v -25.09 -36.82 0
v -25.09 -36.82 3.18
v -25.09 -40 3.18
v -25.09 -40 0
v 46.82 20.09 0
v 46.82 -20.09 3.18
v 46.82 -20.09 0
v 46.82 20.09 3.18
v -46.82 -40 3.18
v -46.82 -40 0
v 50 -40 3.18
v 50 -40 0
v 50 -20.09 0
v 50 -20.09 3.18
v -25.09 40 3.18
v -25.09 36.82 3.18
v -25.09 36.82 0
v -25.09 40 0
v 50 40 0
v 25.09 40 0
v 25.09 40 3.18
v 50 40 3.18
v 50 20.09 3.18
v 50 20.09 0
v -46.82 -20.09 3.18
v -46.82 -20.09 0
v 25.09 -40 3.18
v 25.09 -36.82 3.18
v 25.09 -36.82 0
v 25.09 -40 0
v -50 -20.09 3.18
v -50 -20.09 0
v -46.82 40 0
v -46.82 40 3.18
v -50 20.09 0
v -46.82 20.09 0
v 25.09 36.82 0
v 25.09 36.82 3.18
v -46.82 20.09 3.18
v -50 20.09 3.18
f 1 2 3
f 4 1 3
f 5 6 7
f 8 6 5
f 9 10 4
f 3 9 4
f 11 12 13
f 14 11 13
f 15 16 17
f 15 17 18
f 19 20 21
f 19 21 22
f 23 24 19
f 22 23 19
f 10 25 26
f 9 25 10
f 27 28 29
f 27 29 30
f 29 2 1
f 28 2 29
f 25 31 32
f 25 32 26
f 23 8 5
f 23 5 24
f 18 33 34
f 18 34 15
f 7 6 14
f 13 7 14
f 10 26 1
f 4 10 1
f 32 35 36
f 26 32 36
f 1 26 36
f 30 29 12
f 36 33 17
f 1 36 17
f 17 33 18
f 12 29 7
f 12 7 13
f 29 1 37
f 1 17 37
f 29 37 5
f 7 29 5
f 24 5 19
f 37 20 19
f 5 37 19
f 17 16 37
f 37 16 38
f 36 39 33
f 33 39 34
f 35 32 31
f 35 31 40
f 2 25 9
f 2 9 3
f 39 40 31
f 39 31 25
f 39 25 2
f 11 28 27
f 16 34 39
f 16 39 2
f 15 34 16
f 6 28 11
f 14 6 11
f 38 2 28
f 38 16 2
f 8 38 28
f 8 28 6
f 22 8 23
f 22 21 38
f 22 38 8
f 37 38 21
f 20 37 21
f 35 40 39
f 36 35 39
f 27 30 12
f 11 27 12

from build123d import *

# Parameters (mm, degrees)
SKETCH3_W           = 100
SKETCH3_H           = 80
BOSS_EXTRUDE1_DEPTH = 3.18
SKETCH4_W           = 50.18
SKETCH4_H           = 3.18
CUT_EXTRUDE1_DEPTH  = 3.18
SKETCH5_W           = 3.18
SKETCH5_H           = 40.18
CUT_EXTRUDE2_DEPTH  = 3.18
SKETCH6_W           = 3.18
SKETCH6_H           = 19.91
CUT_EXTRUDE3_DEPTH  = 3.18


with BuildPart() as part:
    # Sketch3 → Boss-Extrude1 (new body)
    with BuildSketch(Plane.XY):
        Rectangle(SKETCH3_W, SKETCH3_H)
    extrude(amount=BOSS_EXTRUDE1_DEPTH)

    # Sketch4 → Cut-Extrude1 (cut)
    with BuildSketch(Plane.XY.offset(3.18)):
        with Locations((0, 38.41)):
            Rectangle(SKETCH4_W, SKETCH4_H)
    cut_extrude1 = extrude(amount=-CUT_EXTRUDE1_DEPTH, mode=Mode.SUBTRACT)

    # Mirror1: Cut-Extrude1 across plane
    add(cut_extrude1.mirror(Plane.ZX), mode=Mode.SUBTRACT)

    # Sketch5 → Cut-Extrude2 (cut)
    with BuildSketch(Plane.XY.offset(3.18)):
        with Locations((48.41, 0)):
            Rectangle(SKETCH5_W, SKETCH5_H)
    extrude(amount=-CUT_EXTRUDE2_DEPTH, mode=Mode.SUBTRACT)

    # Sketch6 → Cut-Extrude3 (cut)
    with BuildSketch(Plane.XY.offset(3.18)):
        with Locations((-48.41, 30.045)):
            Rectangle(SKETCH6_W, SKETCH6_H)
    cut_extrude3 = extrude(amount=-CUT_EXTRUDE3_DEPTH, mode=Mode.SUBTRACT)

    # Mirror2: Cut-Extrude3 across plane
    add(cut_extrude3.mirror(Plane.ZX), mode=Mode.SUBTRACT)


solid = part.part
